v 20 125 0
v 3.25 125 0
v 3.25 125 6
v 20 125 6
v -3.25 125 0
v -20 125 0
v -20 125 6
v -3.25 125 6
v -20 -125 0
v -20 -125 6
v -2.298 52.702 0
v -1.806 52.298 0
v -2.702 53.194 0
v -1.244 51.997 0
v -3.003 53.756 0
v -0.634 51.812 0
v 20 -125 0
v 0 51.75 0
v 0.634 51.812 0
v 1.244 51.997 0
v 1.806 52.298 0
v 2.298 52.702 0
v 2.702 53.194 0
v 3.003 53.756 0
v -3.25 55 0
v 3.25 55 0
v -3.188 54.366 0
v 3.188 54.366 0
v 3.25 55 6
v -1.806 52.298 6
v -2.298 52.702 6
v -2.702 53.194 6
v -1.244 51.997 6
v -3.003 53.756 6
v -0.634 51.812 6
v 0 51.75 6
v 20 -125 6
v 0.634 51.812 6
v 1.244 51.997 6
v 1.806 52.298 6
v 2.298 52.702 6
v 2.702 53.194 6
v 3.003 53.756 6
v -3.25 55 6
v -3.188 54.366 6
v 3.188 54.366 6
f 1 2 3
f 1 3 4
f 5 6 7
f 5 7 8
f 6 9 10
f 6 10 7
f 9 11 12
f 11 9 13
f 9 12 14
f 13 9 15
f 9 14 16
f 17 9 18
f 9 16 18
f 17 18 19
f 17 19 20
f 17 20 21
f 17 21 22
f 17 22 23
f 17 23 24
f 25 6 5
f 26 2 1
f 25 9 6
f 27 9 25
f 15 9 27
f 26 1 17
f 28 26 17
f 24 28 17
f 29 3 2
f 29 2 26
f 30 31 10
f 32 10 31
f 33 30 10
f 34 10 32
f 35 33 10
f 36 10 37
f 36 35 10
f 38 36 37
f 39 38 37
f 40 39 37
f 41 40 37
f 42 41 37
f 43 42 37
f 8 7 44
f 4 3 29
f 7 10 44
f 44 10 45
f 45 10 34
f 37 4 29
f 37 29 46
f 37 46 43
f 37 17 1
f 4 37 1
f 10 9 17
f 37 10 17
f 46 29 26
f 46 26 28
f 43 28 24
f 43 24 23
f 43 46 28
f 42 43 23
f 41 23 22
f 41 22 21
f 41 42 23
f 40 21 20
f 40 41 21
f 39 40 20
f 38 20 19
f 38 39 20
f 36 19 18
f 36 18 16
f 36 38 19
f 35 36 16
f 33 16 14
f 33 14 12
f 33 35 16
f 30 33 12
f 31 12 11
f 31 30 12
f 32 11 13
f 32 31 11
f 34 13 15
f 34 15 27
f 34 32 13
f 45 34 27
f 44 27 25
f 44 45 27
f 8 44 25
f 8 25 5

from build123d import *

# Parameters (mm, degrees)
SKETCH1_W           = 40
SKETCH1_H           = 250
BOSS_EXTRUDE1_DEPTH = 6
CUT_EXTRUDE1_DEPTH  = 6


with BuildPart() as part:
    # Sketch1 → Boss-Extrude1 (new body)
    with BuildSketch(Plane.XY):
        Rectangle(SKETCH1_W, SKETCH1_H)
    extrude(amount=BOSS_EXTRUDE1_DEPTH)

    # Sketch2 → Cut-Extrude1 (cut)
    with BuildSketch(Plane.XY.offset(6)):
        with BuildLine():
            Line((-3.25, 125), (3.25, 125))
            Line((3.25, 125), (3.25, 55))
            ThreePointArc((3.25, 55), (0, 51.75), (-3.25, 55))
            Line((-3.25, 55), (-3.25, 125))
        make_face()
    extrude(amount=-CUT_EXTRUDE1_DEPTH, mode=Mode.SUBTRACT)


solid = part.part
